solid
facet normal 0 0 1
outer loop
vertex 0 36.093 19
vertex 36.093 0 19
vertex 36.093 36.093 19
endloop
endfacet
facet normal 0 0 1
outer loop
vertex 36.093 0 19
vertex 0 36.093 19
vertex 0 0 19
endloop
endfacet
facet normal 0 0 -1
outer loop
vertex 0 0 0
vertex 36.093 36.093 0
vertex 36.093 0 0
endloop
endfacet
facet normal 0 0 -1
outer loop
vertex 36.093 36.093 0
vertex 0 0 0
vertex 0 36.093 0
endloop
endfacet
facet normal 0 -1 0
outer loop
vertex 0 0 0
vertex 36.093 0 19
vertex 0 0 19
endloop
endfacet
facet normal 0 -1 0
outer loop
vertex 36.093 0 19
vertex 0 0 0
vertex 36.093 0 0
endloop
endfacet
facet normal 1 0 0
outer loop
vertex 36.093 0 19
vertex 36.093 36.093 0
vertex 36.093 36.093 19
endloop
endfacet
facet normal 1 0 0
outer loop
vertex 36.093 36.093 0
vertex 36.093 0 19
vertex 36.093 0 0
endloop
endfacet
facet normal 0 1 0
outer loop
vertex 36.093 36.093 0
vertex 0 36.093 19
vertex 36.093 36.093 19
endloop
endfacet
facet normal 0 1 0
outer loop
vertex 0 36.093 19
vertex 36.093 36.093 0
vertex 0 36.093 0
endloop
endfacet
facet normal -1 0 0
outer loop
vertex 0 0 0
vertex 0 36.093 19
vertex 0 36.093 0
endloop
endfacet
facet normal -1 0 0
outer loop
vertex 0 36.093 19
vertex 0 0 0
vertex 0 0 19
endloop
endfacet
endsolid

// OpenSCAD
cube([36.09336, 36.09336, 19]);
translate([0.848, 0.838, 0])
    linear_extrude(height = 23.56, convexity = 5)
        import(file = "smiley.dxf", layer = "0");
